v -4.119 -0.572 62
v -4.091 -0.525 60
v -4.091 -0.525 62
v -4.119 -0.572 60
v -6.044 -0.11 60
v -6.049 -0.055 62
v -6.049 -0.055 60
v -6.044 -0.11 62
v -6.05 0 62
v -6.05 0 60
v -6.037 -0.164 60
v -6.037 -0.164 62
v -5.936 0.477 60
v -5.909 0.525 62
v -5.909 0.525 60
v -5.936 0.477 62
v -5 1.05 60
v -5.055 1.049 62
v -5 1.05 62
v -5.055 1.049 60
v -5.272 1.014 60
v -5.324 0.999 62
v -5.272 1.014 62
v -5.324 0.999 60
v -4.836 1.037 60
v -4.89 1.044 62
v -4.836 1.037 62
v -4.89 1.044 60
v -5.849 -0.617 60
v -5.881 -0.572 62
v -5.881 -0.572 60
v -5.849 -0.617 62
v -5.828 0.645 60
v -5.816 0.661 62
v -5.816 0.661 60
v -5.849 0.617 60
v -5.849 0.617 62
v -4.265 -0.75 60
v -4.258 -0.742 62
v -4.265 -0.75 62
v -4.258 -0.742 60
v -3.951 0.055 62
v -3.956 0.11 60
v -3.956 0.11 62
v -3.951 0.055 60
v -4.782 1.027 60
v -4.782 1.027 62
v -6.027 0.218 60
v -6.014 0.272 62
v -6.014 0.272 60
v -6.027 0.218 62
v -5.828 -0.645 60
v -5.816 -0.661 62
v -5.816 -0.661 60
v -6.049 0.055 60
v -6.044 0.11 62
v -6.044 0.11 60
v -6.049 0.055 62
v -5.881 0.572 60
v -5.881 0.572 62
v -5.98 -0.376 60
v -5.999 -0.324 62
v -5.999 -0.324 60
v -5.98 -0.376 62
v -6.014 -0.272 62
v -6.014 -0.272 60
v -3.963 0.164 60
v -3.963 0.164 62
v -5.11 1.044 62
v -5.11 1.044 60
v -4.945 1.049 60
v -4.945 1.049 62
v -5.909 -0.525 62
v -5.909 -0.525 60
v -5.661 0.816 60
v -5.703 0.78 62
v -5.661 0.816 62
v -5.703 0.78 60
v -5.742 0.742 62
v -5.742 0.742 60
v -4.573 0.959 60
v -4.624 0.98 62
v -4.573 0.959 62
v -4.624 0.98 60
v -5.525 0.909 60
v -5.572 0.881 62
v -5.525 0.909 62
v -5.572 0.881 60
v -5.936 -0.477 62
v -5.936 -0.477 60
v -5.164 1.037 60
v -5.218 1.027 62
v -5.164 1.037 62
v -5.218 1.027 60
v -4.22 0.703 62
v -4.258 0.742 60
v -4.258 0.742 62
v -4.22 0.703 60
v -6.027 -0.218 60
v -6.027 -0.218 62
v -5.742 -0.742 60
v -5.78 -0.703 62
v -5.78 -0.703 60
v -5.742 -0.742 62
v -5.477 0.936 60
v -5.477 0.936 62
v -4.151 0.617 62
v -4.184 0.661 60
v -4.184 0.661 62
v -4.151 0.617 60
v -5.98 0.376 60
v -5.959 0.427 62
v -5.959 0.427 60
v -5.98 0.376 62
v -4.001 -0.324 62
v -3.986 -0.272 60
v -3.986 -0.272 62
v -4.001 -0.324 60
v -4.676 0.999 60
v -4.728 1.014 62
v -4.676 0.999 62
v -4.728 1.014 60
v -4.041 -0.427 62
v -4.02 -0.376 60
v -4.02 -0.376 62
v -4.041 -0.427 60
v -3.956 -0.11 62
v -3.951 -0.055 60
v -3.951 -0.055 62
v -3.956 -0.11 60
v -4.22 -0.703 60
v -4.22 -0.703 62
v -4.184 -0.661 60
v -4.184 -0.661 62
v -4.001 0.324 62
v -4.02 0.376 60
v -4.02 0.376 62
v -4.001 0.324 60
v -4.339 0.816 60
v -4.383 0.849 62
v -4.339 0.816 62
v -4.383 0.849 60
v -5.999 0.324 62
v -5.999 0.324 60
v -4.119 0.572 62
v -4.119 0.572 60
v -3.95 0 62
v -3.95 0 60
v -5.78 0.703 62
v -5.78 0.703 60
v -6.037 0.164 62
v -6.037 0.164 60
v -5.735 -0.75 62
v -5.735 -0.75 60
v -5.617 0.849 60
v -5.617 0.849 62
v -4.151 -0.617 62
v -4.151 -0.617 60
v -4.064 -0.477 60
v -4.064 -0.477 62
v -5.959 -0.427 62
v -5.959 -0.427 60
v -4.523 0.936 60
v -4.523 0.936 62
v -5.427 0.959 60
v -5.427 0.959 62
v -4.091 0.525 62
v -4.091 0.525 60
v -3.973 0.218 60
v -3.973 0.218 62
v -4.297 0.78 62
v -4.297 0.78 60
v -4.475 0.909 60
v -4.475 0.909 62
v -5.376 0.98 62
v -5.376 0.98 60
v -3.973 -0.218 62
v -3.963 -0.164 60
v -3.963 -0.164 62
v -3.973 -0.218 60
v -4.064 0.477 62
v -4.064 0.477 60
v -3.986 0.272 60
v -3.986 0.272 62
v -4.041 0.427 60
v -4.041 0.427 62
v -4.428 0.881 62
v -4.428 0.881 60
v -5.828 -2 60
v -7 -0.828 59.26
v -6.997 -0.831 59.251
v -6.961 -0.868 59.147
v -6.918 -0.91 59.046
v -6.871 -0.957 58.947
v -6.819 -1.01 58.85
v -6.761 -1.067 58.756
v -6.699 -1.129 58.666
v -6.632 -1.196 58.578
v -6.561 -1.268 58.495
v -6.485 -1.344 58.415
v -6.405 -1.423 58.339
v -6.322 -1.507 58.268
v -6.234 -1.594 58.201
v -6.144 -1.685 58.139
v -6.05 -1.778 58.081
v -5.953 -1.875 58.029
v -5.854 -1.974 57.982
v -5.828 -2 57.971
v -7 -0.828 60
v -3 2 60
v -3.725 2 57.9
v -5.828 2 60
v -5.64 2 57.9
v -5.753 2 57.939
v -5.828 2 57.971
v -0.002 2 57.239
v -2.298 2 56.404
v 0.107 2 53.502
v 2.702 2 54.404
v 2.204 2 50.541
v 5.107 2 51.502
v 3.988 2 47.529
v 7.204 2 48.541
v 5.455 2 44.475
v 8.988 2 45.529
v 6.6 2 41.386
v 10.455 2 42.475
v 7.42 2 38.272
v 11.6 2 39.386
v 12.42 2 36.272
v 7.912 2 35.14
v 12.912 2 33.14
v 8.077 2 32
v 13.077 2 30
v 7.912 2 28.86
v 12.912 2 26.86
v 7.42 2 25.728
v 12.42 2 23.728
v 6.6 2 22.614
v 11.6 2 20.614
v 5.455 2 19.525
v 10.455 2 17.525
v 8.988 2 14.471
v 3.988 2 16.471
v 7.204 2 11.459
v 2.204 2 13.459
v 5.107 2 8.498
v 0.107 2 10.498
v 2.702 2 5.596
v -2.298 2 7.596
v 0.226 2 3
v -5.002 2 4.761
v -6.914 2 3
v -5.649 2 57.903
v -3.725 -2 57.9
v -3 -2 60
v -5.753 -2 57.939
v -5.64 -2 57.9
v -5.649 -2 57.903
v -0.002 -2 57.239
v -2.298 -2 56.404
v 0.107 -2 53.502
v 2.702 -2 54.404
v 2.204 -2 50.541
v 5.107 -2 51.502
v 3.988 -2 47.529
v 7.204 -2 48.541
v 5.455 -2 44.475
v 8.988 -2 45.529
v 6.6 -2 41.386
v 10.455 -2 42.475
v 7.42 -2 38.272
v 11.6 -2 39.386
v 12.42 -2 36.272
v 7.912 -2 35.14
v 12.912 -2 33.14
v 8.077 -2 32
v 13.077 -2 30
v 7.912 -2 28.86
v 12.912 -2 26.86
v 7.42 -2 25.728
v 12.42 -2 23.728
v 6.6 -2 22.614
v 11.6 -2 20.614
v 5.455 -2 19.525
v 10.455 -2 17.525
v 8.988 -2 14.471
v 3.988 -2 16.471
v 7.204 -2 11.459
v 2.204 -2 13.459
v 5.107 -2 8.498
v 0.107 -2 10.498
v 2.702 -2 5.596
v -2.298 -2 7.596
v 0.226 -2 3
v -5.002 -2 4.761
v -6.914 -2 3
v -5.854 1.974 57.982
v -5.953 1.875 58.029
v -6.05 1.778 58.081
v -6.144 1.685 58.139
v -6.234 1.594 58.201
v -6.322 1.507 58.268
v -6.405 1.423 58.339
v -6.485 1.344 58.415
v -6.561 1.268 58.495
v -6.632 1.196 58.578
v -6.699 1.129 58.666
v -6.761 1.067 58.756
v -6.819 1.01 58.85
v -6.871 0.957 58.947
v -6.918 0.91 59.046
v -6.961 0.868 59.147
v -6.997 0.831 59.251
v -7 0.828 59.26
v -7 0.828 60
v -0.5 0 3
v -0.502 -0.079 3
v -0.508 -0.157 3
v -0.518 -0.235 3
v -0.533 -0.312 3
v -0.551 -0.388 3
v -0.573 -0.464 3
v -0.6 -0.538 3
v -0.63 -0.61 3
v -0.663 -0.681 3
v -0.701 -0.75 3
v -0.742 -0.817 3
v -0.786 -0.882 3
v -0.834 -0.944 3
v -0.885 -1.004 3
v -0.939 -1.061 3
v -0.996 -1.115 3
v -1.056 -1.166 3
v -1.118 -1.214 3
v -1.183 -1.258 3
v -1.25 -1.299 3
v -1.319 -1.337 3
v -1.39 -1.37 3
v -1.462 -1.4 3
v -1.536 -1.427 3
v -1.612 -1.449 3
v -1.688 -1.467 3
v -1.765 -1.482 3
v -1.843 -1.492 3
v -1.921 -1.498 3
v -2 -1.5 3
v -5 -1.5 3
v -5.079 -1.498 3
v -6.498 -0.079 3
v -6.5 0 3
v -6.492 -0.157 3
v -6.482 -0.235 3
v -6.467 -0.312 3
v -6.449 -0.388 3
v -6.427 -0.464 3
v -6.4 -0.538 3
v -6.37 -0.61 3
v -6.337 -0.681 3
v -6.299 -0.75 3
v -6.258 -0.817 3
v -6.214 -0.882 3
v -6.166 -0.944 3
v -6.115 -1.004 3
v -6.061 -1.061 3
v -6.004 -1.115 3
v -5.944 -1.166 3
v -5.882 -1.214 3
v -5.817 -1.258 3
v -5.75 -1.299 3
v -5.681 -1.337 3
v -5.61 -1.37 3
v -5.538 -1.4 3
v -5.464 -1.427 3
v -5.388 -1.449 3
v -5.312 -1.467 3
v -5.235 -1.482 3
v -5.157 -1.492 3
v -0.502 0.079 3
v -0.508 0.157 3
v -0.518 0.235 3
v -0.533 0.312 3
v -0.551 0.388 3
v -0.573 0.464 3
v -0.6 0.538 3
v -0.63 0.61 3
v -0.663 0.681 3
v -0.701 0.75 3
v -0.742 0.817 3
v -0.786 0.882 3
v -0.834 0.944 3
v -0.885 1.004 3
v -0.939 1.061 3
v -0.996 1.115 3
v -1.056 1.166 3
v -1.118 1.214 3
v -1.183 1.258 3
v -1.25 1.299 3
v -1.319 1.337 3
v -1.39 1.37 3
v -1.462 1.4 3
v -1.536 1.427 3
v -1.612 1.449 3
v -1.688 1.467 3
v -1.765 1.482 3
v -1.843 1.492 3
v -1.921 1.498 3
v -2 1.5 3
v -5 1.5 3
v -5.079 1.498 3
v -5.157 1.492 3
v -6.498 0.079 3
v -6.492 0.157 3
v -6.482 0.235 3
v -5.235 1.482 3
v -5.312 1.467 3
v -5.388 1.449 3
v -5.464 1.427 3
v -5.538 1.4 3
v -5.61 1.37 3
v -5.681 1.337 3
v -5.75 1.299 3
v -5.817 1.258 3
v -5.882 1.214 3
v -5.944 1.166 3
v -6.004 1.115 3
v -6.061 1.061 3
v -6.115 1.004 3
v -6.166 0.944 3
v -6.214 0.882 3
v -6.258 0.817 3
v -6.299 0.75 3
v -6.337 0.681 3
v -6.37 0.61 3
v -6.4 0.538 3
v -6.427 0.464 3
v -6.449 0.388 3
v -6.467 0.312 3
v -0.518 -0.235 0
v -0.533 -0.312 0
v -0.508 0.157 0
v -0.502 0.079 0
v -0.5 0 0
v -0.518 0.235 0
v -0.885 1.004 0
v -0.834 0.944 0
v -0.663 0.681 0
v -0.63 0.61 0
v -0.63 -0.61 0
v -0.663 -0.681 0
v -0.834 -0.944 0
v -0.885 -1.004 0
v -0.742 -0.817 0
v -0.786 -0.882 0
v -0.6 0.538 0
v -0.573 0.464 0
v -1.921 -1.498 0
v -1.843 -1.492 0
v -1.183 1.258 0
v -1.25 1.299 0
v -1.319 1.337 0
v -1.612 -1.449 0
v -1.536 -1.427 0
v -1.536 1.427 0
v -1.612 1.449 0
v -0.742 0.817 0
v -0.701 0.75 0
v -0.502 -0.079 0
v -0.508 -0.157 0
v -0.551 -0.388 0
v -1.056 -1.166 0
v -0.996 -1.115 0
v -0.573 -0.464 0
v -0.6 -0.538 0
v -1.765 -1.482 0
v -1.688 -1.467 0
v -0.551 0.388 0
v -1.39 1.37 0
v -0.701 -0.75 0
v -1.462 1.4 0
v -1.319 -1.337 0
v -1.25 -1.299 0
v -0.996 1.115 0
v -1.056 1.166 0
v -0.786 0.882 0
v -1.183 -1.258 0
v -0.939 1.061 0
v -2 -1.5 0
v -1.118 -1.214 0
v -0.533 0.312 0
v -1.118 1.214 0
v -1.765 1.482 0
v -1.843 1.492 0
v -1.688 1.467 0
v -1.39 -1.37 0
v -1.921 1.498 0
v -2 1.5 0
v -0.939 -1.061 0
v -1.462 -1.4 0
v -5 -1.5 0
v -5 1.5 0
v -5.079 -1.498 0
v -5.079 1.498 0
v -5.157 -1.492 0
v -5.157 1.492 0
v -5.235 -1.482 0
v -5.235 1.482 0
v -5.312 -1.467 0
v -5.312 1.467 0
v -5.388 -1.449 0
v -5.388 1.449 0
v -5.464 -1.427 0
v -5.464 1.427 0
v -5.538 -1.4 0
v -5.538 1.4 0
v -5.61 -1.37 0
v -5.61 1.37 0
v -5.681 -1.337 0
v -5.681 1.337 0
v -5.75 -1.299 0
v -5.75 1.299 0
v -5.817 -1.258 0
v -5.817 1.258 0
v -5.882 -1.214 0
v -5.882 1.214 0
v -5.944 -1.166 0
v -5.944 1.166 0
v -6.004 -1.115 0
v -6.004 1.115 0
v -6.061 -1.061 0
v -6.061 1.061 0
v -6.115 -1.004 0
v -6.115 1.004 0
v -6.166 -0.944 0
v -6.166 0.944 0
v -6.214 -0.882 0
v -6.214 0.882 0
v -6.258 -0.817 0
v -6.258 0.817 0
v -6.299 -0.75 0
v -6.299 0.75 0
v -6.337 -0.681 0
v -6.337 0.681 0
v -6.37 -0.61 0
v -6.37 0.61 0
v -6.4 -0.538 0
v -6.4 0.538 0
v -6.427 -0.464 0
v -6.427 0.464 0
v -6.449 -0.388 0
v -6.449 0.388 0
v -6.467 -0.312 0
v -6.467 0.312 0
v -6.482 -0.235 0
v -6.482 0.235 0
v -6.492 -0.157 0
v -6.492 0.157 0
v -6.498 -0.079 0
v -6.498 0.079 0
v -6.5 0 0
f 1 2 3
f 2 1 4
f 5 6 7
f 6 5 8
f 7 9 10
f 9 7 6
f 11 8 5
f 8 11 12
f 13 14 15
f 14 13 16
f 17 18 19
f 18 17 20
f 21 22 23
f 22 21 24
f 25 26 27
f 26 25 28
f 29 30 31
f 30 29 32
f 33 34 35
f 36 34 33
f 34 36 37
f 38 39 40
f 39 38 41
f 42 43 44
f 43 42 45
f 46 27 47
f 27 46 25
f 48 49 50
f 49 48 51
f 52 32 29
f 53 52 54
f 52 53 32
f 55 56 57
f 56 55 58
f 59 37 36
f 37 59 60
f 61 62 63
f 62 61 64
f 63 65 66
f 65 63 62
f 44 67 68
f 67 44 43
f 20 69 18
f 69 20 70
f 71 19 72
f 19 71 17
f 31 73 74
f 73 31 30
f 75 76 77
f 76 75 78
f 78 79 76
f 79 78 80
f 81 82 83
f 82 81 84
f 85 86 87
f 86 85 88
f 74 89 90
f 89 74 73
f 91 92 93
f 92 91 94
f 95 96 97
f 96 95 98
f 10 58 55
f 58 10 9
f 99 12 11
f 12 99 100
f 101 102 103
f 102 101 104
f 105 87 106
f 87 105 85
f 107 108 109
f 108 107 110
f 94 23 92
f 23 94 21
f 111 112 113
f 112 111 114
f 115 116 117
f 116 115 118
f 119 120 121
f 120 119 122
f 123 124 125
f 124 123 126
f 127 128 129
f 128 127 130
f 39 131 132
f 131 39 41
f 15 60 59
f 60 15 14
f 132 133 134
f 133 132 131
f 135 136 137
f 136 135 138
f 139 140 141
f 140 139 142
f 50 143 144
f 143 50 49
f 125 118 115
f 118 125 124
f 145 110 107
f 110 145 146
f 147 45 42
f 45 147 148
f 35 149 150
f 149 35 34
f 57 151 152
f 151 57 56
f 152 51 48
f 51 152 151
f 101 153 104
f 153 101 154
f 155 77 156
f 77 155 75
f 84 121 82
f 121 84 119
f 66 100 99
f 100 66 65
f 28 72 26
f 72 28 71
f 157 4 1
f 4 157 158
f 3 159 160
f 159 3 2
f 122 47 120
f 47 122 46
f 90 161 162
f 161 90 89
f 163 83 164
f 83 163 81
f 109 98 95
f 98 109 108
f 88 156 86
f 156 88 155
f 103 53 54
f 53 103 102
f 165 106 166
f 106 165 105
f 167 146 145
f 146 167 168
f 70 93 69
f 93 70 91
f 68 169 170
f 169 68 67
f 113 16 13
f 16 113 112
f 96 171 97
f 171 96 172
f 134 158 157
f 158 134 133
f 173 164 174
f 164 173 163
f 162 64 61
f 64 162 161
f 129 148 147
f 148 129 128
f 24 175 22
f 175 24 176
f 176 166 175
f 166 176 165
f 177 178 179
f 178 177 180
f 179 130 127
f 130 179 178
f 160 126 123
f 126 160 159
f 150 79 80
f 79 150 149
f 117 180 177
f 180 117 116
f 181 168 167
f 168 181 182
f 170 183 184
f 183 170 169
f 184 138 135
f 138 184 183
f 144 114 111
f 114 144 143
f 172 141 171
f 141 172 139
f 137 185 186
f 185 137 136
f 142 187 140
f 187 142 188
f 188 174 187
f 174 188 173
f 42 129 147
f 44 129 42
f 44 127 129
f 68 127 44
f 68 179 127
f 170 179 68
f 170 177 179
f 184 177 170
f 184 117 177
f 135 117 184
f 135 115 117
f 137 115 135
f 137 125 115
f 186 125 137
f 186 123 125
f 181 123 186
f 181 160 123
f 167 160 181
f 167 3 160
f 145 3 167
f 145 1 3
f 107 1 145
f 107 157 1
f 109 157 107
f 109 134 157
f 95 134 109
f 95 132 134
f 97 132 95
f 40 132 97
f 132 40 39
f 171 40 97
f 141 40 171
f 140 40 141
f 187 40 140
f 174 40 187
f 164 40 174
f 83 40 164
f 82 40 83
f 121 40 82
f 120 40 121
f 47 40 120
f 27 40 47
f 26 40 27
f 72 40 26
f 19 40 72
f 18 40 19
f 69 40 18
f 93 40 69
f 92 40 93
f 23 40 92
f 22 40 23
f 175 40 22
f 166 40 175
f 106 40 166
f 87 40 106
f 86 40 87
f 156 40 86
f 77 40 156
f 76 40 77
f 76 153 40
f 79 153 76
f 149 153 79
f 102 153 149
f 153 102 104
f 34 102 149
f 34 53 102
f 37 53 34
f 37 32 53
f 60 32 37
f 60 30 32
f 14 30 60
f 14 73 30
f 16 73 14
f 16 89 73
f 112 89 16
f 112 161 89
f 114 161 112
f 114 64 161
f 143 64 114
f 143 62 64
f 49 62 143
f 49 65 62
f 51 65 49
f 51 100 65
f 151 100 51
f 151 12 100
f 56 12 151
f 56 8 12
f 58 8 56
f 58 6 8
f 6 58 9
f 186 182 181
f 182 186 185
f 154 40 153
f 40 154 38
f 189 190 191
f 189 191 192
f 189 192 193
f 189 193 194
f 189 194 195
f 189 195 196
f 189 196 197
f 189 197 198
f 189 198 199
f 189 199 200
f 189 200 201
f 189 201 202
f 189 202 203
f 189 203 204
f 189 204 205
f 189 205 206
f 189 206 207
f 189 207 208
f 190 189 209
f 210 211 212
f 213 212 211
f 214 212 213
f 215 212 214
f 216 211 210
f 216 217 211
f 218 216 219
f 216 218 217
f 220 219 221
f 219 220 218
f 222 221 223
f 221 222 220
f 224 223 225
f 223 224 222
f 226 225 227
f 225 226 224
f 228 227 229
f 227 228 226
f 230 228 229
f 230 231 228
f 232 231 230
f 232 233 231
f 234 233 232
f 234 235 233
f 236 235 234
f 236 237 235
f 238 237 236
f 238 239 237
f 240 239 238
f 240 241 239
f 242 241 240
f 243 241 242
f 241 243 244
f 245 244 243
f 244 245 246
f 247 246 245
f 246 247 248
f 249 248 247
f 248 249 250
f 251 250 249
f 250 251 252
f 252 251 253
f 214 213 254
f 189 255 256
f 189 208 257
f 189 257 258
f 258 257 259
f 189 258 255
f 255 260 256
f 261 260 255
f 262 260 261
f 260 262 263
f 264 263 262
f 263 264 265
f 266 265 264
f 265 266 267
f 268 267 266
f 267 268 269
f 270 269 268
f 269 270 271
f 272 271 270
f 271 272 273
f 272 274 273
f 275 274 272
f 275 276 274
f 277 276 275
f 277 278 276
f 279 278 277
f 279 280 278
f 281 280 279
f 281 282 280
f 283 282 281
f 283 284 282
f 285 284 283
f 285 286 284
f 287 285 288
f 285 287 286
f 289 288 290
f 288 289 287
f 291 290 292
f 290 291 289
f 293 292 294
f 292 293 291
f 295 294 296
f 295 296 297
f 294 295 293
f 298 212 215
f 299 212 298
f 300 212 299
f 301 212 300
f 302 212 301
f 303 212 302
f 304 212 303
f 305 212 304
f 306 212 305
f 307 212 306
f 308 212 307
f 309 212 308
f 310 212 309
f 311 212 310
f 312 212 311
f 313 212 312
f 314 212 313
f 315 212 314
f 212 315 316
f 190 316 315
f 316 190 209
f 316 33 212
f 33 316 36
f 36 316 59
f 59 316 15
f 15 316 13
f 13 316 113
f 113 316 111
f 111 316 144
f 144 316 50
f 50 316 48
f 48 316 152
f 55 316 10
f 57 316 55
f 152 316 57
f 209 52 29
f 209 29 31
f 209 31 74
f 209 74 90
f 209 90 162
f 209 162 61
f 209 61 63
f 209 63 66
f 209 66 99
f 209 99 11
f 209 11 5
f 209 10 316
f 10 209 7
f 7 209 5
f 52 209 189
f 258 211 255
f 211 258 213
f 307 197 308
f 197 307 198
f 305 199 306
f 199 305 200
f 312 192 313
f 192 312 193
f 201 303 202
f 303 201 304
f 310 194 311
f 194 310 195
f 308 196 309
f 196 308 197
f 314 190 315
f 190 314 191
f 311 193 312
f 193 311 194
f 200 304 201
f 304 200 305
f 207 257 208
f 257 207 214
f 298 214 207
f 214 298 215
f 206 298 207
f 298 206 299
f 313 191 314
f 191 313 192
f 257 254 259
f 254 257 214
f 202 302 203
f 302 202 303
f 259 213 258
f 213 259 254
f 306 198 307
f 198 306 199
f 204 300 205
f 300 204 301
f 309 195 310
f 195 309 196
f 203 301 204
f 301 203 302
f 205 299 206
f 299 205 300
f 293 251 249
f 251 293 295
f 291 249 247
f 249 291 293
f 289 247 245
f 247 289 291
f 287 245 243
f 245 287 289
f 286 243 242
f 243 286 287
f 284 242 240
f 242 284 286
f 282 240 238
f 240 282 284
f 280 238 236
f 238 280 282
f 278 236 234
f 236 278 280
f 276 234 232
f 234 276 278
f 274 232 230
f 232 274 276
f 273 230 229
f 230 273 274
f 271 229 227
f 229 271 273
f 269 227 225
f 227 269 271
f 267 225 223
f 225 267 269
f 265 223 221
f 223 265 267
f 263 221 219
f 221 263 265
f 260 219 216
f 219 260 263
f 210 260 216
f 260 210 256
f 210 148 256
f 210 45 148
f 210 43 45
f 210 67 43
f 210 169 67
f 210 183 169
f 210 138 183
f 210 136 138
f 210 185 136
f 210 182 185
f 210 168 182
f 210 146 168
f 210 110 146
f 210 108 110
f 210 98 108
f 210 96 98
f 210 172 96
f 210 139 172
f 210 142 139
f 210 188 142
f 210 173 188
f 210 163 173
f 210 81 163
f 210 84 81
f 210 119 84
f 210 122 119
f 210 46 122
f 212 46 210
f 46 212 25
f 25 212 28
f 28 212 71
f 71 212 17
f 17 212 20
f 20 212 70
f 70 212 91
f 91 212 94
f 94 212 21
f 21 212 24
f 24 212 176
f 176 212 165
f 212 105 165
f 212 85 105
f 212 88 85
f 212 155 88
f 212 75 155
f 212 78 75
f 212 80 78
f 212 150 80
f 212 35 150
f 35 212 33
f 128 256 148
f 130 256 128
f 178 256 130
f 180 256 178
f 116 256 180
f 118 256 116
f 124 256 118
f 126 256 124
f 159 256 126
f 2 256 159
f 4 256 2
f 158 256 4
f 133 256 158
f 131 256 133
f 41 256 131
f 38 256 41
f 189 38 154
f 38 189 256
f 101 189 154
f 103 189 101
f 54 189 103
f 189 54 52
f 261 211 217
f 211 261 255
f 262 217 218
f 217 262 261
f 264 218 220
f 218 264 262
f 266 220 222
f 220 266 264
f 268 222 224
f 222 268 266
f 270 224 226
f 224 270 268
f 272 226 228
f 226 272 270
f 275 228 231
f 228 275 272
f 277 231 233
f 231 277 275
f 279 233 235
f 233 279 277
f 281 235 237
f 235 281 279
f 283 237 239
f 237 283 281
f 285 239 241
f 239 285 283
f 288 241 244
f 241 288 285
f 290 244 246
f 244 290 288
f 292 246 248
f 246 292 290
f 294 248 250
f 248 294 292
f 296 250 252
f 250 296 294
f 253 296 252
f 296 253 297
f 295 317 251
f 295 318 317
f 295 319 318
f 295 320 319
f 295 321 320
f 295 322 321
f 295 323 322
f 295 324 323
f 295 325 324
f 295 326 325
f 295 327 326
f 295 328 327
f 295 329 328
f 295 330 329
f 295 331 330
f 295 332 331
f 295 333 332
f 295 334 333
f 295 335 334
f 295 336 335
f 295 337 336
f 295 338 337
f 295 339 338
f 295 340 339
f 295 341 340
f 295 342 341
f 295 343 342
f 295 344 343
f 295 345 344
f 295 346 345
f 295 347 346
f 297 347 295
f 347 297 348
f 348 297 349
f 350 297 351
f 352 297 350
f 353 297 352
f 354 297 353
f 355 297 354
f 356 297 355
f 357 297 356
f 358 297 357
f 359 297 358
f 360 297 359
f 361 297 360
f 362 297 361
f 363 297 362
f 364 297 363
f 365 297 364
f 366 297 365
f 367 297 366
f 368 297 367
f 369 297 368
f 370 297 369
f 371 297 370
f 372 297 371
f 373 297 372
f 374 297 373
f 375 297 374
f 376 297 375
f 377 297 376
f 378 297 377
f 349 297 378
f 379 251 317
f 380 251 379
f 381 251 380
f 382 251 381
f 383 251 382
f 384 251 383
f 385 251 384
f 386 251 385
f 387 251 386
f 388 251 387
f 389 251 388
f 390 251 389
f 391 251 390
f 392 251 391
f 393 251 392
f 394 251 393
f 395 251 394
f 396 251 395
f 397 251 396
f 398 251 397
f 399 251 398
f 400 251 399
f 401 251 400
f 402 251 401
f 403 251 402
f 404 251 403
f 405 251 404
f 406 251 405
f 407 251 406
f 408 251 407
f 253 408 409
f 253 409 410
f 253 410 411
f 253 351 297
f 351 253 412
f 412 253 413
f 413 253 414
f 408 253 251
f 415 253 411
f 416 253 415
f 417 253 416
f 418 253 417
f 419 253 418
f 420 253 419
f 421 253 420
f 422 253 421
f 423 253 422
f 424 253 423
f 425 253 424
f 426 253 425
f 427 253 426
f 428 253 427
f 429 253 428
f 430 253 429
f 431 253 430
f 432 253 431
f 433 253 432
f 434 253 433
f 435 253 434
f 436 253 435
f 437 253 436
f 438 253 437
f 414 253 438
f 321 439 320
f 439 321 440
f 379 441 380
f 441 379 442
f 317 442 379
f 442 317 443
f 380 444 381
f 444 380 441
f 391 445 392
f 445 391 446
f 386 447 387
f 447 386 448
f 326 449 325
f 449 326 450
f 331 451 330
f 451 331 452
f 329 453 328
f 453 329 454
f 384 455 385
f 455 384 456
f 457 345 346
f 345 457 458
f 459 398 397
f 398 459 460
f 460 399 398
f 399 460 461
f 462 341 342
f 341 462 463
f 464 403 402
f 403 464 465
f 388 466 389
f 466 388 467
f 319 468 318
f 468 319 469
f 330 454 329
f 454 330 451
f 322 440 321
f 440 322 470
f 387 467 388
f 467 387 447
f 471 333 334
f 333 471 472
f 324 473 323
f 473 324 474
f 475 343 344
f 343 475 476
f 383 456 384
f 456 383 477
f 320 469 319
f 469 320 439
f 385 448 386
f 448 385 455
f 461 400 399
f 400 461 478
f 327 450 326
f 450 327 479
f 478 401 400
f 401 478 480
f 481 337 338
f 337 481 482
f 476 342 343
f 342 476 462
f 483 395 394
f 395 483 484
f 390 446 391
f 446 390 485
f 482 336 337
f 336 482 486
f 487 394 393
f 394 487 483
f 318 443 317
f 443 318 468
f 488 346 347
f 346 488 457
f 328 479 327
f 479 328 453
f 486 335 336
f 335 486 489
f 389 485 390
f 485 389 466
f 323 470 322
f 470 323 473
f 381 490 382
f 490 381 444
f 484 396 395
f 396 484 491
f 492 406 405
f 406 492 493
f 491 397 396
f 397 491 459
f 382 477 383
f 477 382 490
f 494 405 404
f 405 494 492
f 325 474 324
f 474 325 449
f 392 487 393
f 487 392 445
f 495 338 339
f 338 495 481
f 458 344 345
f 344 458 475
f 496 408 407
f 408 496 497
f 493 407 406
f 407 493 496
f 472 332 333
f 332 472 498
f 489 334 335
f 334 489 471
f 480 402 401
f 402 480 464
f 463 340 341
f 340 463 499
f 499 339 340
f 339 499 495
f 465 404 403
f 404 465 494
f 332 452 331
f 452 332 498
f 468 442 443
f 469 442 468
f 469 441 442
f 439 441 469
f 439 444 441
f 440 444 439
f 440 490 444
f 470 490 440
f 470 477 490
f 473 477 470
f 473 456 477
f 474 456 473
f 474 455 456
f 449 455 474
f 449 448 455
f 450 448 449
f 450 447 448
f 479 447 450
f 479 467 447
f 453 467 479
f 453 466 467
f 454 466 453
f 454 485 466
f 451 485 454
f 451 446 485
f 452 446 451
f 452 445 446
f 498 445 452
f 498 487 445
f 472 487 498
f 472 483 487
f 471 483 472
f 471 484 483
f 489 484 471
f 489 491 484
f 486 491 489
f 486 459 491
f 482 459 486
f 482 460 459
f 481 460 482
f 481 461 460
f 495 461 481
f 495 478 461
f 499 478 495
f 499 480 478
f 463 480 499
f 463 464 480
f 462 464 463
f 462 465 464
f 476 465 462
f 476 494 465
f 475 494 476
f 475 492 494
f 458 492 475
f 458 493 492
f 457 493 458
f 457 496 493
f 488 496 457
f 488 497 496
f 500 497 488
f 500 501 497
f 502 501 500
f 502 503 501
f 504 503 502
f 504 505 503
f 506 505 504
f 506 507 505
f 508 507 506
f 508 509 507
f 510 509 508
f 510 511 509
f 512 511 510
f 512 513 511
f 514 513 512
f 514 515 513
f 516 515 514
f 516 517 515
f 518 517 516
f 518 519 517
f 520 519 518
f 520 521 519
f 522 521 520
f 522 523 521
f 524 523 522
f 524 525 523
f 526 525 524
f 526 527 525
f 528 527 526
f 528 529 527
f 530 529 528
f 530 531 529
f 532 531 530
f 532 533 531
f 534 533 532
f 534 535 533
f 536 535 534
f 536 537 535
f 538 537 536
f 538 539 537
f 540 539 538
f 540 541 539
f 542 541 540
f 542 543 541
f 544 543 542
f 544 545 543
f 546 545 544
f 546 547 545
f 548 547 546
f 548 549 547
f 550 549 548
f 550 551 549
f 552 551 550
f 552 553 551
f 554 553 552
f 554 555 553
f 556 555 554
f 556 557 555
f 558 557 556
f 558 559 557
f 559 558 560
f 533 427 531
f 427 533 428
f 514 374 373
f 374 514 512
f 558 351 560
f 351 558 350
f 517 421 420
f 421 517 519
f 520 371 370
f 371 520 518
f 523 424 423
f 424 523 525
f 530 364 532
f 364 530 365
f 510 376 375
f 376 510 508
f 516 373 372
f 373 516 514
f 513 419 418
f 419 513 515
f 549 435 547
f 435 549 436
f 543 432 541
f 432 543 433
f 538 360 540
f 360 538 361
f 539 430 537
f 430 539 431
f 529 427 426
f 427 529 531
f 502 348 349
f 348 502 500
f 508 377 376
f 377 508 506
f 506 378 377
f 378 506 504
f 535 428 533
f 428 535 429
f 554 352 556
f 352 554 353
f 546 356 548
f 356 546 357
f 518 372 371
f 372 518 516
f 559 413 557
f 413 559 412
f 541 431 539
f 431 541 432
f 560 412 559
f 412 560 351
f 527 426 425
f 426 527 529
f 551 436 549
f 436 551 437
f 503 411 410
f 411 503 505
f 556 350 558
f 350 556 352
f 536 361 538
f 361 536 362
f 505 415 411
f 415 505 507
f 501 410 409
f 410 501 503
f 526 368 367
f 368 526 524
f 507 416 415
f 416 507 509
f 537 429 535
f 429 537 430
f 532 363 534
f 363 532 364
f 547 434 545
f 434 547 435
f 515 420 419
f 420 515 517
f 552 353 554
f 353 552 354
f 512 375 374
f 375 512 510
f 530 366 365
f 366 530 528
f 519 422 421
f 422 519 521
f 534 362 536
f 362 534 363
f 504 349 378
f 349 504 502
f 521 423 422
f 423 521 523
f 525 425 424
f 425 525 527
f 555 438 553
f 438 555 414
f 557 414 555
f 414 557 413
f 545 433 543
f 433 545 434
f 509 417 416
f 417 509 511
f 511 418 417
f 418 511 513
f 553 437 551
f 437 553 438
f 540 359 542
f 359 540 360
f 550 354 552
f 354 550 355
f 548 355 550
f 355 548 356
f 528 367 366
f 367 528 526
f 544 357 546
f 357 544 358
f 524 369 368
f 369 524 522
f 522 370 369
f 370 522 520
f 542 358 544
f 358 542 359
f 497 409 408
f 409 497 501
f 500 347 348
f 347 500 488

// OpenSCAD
$fn = 120;
JOIN = 0.1;


plug_inner_diameter =   2.1;  // mm
plug_inner_to_flat  =   1.8;  // mm
plug_inner_height   =   2.0;  // mm

plug_base_diameter  =   4.0;  // mm
plug_base_height    =   2.0;  // mm

stem_height         =  60.0;  // mm
stem_width          =   5.0;  // mm
stem_radius         =  60.0;  // mm

base_diameter       =  30.0;  // mm
base_height         =   3.0;  // mm

connector_slack     =   0.1;  // mm


function vector(x) = [x, x, x];

module adjust_join() {
    translate([0, 0, -JOIN]) children();
}


module plug() {
    rotate([0, 0, 180])
        difference() {
            adjust_join()
                cylinder(d=plug_inner_diameter, h=plug_inner_height + JOIN);

            cut_y = plug_inner_diameter / 2 - plug_inner_to_flat;
            pid = plug_inner_diameter;
            translate([-pid, -cut_y, -pid])
                 cube(vector(pid*2) * 2);
            }
}


module plug_base() {
    adjust_join() {
        intersection(){
            octagon_half_angle = 360 / 8 / 2;
            octagon_diameter = plug_base_diameter / cos(octagon_half_angle);
            rotate([0, 0, octagon_half_angle])
                cylinder(d=octagon_diameter, h=plug_base_height + JOIN, $fn=8);

            translate([0, plug_base_diameter / 2, plug_base_diameter / 2])
                rotate([90, 0, 0])
                    cylinder(d=plug_base_diameter + JOIN * 2, h=plug_base_diameter);
        }

        translate([0, -plug_base_diameter / 2, 0])
            cube([plug_base_diameter / 2, plug_base_diameter, plug_base_height + JOIN]);
    }
}

module base_stem_2d(scale_x=2.5) {
    difference() {
        circle(r=stem_radius);

        translate([-stem_width / scale_x, stem_width * 0.4, 0])
            circle(r=stem_radius);

        translate([-1, stem_height / 2, 0])
            square([stem_radius + 1, stem_radius]);
        translate([-1, -stem_radius - stem_height / 2, 0])
            square([stem_radius + 1, stem_radius]);
        translate([-stem_radius - 1, -stem_radius, 0])
            square([stem_radius + 1, stem_radius * 2]);
    }
}


module stem(scale_x=2.5) {
    sin_x = ((stem_height / 2) / stem_radius);
    angle_x = asin(sin_x);
    arc_x = cos(angle_x)  * stem_radius;
    dx = arc_x * scale_x ;

    difference() {
        translate([2, 0, 0])
            rotate([90, 0, 0])
                translate([-dx, stem_height / 2, -plug_base_diameter/2])
                    scale([scale_x, 1, 1])
                        linear_extrude(plug_base_diameter)
                            base_stem_2d(scale_x=scale_x);

        translate([0, 0, -base_diameter + base_height])
            cube(vector(base_diameter * 2), center=true);
    }
}

module base_plate() {
    difference() {
        translate([0, 0, -base_diameter * 0.4])
            sphere(r=base_diameter * .65);

        translate([0, 0, -base_diameter - 1])
            cube(vector(base_diameter + 1) * 2, center=true);
        translate([0, 0, base_diameter + base_height + 1])
            cube(vector(base_diameter + 1) * 2, center=true);


        connector(slack=connector_slack);
    }
}


module connector(slack=0) {

    width = plug_base_diameter - 1 + slack * 2;
    height = base_height + JOIN + slack * 2;

    translate([-2, 0, -slack]) {
        cylinder(d=width, h=height);

        translate([-3, 0, 0])
            cylinder(d=width, h=height);

        translate([-3, -width / 2, 0])
            cube([3, width, height]);
        }
}


module raiser_assembly() {
    translate([-5 ,0 ,0]) {
        translate([0, 0, stem_height]) {
            plug();
            translate([0, 0, -plug_base_height]) plug_base();
        }
        stem(scale_x=2);
    }
    connector();
}

module full_assembly() {
    raiser_assembly();
    base_plate();
}



translate([ 0, 0, 0]) raiser_assembly();
//translate([+20, 0, 0]) base_plate();
